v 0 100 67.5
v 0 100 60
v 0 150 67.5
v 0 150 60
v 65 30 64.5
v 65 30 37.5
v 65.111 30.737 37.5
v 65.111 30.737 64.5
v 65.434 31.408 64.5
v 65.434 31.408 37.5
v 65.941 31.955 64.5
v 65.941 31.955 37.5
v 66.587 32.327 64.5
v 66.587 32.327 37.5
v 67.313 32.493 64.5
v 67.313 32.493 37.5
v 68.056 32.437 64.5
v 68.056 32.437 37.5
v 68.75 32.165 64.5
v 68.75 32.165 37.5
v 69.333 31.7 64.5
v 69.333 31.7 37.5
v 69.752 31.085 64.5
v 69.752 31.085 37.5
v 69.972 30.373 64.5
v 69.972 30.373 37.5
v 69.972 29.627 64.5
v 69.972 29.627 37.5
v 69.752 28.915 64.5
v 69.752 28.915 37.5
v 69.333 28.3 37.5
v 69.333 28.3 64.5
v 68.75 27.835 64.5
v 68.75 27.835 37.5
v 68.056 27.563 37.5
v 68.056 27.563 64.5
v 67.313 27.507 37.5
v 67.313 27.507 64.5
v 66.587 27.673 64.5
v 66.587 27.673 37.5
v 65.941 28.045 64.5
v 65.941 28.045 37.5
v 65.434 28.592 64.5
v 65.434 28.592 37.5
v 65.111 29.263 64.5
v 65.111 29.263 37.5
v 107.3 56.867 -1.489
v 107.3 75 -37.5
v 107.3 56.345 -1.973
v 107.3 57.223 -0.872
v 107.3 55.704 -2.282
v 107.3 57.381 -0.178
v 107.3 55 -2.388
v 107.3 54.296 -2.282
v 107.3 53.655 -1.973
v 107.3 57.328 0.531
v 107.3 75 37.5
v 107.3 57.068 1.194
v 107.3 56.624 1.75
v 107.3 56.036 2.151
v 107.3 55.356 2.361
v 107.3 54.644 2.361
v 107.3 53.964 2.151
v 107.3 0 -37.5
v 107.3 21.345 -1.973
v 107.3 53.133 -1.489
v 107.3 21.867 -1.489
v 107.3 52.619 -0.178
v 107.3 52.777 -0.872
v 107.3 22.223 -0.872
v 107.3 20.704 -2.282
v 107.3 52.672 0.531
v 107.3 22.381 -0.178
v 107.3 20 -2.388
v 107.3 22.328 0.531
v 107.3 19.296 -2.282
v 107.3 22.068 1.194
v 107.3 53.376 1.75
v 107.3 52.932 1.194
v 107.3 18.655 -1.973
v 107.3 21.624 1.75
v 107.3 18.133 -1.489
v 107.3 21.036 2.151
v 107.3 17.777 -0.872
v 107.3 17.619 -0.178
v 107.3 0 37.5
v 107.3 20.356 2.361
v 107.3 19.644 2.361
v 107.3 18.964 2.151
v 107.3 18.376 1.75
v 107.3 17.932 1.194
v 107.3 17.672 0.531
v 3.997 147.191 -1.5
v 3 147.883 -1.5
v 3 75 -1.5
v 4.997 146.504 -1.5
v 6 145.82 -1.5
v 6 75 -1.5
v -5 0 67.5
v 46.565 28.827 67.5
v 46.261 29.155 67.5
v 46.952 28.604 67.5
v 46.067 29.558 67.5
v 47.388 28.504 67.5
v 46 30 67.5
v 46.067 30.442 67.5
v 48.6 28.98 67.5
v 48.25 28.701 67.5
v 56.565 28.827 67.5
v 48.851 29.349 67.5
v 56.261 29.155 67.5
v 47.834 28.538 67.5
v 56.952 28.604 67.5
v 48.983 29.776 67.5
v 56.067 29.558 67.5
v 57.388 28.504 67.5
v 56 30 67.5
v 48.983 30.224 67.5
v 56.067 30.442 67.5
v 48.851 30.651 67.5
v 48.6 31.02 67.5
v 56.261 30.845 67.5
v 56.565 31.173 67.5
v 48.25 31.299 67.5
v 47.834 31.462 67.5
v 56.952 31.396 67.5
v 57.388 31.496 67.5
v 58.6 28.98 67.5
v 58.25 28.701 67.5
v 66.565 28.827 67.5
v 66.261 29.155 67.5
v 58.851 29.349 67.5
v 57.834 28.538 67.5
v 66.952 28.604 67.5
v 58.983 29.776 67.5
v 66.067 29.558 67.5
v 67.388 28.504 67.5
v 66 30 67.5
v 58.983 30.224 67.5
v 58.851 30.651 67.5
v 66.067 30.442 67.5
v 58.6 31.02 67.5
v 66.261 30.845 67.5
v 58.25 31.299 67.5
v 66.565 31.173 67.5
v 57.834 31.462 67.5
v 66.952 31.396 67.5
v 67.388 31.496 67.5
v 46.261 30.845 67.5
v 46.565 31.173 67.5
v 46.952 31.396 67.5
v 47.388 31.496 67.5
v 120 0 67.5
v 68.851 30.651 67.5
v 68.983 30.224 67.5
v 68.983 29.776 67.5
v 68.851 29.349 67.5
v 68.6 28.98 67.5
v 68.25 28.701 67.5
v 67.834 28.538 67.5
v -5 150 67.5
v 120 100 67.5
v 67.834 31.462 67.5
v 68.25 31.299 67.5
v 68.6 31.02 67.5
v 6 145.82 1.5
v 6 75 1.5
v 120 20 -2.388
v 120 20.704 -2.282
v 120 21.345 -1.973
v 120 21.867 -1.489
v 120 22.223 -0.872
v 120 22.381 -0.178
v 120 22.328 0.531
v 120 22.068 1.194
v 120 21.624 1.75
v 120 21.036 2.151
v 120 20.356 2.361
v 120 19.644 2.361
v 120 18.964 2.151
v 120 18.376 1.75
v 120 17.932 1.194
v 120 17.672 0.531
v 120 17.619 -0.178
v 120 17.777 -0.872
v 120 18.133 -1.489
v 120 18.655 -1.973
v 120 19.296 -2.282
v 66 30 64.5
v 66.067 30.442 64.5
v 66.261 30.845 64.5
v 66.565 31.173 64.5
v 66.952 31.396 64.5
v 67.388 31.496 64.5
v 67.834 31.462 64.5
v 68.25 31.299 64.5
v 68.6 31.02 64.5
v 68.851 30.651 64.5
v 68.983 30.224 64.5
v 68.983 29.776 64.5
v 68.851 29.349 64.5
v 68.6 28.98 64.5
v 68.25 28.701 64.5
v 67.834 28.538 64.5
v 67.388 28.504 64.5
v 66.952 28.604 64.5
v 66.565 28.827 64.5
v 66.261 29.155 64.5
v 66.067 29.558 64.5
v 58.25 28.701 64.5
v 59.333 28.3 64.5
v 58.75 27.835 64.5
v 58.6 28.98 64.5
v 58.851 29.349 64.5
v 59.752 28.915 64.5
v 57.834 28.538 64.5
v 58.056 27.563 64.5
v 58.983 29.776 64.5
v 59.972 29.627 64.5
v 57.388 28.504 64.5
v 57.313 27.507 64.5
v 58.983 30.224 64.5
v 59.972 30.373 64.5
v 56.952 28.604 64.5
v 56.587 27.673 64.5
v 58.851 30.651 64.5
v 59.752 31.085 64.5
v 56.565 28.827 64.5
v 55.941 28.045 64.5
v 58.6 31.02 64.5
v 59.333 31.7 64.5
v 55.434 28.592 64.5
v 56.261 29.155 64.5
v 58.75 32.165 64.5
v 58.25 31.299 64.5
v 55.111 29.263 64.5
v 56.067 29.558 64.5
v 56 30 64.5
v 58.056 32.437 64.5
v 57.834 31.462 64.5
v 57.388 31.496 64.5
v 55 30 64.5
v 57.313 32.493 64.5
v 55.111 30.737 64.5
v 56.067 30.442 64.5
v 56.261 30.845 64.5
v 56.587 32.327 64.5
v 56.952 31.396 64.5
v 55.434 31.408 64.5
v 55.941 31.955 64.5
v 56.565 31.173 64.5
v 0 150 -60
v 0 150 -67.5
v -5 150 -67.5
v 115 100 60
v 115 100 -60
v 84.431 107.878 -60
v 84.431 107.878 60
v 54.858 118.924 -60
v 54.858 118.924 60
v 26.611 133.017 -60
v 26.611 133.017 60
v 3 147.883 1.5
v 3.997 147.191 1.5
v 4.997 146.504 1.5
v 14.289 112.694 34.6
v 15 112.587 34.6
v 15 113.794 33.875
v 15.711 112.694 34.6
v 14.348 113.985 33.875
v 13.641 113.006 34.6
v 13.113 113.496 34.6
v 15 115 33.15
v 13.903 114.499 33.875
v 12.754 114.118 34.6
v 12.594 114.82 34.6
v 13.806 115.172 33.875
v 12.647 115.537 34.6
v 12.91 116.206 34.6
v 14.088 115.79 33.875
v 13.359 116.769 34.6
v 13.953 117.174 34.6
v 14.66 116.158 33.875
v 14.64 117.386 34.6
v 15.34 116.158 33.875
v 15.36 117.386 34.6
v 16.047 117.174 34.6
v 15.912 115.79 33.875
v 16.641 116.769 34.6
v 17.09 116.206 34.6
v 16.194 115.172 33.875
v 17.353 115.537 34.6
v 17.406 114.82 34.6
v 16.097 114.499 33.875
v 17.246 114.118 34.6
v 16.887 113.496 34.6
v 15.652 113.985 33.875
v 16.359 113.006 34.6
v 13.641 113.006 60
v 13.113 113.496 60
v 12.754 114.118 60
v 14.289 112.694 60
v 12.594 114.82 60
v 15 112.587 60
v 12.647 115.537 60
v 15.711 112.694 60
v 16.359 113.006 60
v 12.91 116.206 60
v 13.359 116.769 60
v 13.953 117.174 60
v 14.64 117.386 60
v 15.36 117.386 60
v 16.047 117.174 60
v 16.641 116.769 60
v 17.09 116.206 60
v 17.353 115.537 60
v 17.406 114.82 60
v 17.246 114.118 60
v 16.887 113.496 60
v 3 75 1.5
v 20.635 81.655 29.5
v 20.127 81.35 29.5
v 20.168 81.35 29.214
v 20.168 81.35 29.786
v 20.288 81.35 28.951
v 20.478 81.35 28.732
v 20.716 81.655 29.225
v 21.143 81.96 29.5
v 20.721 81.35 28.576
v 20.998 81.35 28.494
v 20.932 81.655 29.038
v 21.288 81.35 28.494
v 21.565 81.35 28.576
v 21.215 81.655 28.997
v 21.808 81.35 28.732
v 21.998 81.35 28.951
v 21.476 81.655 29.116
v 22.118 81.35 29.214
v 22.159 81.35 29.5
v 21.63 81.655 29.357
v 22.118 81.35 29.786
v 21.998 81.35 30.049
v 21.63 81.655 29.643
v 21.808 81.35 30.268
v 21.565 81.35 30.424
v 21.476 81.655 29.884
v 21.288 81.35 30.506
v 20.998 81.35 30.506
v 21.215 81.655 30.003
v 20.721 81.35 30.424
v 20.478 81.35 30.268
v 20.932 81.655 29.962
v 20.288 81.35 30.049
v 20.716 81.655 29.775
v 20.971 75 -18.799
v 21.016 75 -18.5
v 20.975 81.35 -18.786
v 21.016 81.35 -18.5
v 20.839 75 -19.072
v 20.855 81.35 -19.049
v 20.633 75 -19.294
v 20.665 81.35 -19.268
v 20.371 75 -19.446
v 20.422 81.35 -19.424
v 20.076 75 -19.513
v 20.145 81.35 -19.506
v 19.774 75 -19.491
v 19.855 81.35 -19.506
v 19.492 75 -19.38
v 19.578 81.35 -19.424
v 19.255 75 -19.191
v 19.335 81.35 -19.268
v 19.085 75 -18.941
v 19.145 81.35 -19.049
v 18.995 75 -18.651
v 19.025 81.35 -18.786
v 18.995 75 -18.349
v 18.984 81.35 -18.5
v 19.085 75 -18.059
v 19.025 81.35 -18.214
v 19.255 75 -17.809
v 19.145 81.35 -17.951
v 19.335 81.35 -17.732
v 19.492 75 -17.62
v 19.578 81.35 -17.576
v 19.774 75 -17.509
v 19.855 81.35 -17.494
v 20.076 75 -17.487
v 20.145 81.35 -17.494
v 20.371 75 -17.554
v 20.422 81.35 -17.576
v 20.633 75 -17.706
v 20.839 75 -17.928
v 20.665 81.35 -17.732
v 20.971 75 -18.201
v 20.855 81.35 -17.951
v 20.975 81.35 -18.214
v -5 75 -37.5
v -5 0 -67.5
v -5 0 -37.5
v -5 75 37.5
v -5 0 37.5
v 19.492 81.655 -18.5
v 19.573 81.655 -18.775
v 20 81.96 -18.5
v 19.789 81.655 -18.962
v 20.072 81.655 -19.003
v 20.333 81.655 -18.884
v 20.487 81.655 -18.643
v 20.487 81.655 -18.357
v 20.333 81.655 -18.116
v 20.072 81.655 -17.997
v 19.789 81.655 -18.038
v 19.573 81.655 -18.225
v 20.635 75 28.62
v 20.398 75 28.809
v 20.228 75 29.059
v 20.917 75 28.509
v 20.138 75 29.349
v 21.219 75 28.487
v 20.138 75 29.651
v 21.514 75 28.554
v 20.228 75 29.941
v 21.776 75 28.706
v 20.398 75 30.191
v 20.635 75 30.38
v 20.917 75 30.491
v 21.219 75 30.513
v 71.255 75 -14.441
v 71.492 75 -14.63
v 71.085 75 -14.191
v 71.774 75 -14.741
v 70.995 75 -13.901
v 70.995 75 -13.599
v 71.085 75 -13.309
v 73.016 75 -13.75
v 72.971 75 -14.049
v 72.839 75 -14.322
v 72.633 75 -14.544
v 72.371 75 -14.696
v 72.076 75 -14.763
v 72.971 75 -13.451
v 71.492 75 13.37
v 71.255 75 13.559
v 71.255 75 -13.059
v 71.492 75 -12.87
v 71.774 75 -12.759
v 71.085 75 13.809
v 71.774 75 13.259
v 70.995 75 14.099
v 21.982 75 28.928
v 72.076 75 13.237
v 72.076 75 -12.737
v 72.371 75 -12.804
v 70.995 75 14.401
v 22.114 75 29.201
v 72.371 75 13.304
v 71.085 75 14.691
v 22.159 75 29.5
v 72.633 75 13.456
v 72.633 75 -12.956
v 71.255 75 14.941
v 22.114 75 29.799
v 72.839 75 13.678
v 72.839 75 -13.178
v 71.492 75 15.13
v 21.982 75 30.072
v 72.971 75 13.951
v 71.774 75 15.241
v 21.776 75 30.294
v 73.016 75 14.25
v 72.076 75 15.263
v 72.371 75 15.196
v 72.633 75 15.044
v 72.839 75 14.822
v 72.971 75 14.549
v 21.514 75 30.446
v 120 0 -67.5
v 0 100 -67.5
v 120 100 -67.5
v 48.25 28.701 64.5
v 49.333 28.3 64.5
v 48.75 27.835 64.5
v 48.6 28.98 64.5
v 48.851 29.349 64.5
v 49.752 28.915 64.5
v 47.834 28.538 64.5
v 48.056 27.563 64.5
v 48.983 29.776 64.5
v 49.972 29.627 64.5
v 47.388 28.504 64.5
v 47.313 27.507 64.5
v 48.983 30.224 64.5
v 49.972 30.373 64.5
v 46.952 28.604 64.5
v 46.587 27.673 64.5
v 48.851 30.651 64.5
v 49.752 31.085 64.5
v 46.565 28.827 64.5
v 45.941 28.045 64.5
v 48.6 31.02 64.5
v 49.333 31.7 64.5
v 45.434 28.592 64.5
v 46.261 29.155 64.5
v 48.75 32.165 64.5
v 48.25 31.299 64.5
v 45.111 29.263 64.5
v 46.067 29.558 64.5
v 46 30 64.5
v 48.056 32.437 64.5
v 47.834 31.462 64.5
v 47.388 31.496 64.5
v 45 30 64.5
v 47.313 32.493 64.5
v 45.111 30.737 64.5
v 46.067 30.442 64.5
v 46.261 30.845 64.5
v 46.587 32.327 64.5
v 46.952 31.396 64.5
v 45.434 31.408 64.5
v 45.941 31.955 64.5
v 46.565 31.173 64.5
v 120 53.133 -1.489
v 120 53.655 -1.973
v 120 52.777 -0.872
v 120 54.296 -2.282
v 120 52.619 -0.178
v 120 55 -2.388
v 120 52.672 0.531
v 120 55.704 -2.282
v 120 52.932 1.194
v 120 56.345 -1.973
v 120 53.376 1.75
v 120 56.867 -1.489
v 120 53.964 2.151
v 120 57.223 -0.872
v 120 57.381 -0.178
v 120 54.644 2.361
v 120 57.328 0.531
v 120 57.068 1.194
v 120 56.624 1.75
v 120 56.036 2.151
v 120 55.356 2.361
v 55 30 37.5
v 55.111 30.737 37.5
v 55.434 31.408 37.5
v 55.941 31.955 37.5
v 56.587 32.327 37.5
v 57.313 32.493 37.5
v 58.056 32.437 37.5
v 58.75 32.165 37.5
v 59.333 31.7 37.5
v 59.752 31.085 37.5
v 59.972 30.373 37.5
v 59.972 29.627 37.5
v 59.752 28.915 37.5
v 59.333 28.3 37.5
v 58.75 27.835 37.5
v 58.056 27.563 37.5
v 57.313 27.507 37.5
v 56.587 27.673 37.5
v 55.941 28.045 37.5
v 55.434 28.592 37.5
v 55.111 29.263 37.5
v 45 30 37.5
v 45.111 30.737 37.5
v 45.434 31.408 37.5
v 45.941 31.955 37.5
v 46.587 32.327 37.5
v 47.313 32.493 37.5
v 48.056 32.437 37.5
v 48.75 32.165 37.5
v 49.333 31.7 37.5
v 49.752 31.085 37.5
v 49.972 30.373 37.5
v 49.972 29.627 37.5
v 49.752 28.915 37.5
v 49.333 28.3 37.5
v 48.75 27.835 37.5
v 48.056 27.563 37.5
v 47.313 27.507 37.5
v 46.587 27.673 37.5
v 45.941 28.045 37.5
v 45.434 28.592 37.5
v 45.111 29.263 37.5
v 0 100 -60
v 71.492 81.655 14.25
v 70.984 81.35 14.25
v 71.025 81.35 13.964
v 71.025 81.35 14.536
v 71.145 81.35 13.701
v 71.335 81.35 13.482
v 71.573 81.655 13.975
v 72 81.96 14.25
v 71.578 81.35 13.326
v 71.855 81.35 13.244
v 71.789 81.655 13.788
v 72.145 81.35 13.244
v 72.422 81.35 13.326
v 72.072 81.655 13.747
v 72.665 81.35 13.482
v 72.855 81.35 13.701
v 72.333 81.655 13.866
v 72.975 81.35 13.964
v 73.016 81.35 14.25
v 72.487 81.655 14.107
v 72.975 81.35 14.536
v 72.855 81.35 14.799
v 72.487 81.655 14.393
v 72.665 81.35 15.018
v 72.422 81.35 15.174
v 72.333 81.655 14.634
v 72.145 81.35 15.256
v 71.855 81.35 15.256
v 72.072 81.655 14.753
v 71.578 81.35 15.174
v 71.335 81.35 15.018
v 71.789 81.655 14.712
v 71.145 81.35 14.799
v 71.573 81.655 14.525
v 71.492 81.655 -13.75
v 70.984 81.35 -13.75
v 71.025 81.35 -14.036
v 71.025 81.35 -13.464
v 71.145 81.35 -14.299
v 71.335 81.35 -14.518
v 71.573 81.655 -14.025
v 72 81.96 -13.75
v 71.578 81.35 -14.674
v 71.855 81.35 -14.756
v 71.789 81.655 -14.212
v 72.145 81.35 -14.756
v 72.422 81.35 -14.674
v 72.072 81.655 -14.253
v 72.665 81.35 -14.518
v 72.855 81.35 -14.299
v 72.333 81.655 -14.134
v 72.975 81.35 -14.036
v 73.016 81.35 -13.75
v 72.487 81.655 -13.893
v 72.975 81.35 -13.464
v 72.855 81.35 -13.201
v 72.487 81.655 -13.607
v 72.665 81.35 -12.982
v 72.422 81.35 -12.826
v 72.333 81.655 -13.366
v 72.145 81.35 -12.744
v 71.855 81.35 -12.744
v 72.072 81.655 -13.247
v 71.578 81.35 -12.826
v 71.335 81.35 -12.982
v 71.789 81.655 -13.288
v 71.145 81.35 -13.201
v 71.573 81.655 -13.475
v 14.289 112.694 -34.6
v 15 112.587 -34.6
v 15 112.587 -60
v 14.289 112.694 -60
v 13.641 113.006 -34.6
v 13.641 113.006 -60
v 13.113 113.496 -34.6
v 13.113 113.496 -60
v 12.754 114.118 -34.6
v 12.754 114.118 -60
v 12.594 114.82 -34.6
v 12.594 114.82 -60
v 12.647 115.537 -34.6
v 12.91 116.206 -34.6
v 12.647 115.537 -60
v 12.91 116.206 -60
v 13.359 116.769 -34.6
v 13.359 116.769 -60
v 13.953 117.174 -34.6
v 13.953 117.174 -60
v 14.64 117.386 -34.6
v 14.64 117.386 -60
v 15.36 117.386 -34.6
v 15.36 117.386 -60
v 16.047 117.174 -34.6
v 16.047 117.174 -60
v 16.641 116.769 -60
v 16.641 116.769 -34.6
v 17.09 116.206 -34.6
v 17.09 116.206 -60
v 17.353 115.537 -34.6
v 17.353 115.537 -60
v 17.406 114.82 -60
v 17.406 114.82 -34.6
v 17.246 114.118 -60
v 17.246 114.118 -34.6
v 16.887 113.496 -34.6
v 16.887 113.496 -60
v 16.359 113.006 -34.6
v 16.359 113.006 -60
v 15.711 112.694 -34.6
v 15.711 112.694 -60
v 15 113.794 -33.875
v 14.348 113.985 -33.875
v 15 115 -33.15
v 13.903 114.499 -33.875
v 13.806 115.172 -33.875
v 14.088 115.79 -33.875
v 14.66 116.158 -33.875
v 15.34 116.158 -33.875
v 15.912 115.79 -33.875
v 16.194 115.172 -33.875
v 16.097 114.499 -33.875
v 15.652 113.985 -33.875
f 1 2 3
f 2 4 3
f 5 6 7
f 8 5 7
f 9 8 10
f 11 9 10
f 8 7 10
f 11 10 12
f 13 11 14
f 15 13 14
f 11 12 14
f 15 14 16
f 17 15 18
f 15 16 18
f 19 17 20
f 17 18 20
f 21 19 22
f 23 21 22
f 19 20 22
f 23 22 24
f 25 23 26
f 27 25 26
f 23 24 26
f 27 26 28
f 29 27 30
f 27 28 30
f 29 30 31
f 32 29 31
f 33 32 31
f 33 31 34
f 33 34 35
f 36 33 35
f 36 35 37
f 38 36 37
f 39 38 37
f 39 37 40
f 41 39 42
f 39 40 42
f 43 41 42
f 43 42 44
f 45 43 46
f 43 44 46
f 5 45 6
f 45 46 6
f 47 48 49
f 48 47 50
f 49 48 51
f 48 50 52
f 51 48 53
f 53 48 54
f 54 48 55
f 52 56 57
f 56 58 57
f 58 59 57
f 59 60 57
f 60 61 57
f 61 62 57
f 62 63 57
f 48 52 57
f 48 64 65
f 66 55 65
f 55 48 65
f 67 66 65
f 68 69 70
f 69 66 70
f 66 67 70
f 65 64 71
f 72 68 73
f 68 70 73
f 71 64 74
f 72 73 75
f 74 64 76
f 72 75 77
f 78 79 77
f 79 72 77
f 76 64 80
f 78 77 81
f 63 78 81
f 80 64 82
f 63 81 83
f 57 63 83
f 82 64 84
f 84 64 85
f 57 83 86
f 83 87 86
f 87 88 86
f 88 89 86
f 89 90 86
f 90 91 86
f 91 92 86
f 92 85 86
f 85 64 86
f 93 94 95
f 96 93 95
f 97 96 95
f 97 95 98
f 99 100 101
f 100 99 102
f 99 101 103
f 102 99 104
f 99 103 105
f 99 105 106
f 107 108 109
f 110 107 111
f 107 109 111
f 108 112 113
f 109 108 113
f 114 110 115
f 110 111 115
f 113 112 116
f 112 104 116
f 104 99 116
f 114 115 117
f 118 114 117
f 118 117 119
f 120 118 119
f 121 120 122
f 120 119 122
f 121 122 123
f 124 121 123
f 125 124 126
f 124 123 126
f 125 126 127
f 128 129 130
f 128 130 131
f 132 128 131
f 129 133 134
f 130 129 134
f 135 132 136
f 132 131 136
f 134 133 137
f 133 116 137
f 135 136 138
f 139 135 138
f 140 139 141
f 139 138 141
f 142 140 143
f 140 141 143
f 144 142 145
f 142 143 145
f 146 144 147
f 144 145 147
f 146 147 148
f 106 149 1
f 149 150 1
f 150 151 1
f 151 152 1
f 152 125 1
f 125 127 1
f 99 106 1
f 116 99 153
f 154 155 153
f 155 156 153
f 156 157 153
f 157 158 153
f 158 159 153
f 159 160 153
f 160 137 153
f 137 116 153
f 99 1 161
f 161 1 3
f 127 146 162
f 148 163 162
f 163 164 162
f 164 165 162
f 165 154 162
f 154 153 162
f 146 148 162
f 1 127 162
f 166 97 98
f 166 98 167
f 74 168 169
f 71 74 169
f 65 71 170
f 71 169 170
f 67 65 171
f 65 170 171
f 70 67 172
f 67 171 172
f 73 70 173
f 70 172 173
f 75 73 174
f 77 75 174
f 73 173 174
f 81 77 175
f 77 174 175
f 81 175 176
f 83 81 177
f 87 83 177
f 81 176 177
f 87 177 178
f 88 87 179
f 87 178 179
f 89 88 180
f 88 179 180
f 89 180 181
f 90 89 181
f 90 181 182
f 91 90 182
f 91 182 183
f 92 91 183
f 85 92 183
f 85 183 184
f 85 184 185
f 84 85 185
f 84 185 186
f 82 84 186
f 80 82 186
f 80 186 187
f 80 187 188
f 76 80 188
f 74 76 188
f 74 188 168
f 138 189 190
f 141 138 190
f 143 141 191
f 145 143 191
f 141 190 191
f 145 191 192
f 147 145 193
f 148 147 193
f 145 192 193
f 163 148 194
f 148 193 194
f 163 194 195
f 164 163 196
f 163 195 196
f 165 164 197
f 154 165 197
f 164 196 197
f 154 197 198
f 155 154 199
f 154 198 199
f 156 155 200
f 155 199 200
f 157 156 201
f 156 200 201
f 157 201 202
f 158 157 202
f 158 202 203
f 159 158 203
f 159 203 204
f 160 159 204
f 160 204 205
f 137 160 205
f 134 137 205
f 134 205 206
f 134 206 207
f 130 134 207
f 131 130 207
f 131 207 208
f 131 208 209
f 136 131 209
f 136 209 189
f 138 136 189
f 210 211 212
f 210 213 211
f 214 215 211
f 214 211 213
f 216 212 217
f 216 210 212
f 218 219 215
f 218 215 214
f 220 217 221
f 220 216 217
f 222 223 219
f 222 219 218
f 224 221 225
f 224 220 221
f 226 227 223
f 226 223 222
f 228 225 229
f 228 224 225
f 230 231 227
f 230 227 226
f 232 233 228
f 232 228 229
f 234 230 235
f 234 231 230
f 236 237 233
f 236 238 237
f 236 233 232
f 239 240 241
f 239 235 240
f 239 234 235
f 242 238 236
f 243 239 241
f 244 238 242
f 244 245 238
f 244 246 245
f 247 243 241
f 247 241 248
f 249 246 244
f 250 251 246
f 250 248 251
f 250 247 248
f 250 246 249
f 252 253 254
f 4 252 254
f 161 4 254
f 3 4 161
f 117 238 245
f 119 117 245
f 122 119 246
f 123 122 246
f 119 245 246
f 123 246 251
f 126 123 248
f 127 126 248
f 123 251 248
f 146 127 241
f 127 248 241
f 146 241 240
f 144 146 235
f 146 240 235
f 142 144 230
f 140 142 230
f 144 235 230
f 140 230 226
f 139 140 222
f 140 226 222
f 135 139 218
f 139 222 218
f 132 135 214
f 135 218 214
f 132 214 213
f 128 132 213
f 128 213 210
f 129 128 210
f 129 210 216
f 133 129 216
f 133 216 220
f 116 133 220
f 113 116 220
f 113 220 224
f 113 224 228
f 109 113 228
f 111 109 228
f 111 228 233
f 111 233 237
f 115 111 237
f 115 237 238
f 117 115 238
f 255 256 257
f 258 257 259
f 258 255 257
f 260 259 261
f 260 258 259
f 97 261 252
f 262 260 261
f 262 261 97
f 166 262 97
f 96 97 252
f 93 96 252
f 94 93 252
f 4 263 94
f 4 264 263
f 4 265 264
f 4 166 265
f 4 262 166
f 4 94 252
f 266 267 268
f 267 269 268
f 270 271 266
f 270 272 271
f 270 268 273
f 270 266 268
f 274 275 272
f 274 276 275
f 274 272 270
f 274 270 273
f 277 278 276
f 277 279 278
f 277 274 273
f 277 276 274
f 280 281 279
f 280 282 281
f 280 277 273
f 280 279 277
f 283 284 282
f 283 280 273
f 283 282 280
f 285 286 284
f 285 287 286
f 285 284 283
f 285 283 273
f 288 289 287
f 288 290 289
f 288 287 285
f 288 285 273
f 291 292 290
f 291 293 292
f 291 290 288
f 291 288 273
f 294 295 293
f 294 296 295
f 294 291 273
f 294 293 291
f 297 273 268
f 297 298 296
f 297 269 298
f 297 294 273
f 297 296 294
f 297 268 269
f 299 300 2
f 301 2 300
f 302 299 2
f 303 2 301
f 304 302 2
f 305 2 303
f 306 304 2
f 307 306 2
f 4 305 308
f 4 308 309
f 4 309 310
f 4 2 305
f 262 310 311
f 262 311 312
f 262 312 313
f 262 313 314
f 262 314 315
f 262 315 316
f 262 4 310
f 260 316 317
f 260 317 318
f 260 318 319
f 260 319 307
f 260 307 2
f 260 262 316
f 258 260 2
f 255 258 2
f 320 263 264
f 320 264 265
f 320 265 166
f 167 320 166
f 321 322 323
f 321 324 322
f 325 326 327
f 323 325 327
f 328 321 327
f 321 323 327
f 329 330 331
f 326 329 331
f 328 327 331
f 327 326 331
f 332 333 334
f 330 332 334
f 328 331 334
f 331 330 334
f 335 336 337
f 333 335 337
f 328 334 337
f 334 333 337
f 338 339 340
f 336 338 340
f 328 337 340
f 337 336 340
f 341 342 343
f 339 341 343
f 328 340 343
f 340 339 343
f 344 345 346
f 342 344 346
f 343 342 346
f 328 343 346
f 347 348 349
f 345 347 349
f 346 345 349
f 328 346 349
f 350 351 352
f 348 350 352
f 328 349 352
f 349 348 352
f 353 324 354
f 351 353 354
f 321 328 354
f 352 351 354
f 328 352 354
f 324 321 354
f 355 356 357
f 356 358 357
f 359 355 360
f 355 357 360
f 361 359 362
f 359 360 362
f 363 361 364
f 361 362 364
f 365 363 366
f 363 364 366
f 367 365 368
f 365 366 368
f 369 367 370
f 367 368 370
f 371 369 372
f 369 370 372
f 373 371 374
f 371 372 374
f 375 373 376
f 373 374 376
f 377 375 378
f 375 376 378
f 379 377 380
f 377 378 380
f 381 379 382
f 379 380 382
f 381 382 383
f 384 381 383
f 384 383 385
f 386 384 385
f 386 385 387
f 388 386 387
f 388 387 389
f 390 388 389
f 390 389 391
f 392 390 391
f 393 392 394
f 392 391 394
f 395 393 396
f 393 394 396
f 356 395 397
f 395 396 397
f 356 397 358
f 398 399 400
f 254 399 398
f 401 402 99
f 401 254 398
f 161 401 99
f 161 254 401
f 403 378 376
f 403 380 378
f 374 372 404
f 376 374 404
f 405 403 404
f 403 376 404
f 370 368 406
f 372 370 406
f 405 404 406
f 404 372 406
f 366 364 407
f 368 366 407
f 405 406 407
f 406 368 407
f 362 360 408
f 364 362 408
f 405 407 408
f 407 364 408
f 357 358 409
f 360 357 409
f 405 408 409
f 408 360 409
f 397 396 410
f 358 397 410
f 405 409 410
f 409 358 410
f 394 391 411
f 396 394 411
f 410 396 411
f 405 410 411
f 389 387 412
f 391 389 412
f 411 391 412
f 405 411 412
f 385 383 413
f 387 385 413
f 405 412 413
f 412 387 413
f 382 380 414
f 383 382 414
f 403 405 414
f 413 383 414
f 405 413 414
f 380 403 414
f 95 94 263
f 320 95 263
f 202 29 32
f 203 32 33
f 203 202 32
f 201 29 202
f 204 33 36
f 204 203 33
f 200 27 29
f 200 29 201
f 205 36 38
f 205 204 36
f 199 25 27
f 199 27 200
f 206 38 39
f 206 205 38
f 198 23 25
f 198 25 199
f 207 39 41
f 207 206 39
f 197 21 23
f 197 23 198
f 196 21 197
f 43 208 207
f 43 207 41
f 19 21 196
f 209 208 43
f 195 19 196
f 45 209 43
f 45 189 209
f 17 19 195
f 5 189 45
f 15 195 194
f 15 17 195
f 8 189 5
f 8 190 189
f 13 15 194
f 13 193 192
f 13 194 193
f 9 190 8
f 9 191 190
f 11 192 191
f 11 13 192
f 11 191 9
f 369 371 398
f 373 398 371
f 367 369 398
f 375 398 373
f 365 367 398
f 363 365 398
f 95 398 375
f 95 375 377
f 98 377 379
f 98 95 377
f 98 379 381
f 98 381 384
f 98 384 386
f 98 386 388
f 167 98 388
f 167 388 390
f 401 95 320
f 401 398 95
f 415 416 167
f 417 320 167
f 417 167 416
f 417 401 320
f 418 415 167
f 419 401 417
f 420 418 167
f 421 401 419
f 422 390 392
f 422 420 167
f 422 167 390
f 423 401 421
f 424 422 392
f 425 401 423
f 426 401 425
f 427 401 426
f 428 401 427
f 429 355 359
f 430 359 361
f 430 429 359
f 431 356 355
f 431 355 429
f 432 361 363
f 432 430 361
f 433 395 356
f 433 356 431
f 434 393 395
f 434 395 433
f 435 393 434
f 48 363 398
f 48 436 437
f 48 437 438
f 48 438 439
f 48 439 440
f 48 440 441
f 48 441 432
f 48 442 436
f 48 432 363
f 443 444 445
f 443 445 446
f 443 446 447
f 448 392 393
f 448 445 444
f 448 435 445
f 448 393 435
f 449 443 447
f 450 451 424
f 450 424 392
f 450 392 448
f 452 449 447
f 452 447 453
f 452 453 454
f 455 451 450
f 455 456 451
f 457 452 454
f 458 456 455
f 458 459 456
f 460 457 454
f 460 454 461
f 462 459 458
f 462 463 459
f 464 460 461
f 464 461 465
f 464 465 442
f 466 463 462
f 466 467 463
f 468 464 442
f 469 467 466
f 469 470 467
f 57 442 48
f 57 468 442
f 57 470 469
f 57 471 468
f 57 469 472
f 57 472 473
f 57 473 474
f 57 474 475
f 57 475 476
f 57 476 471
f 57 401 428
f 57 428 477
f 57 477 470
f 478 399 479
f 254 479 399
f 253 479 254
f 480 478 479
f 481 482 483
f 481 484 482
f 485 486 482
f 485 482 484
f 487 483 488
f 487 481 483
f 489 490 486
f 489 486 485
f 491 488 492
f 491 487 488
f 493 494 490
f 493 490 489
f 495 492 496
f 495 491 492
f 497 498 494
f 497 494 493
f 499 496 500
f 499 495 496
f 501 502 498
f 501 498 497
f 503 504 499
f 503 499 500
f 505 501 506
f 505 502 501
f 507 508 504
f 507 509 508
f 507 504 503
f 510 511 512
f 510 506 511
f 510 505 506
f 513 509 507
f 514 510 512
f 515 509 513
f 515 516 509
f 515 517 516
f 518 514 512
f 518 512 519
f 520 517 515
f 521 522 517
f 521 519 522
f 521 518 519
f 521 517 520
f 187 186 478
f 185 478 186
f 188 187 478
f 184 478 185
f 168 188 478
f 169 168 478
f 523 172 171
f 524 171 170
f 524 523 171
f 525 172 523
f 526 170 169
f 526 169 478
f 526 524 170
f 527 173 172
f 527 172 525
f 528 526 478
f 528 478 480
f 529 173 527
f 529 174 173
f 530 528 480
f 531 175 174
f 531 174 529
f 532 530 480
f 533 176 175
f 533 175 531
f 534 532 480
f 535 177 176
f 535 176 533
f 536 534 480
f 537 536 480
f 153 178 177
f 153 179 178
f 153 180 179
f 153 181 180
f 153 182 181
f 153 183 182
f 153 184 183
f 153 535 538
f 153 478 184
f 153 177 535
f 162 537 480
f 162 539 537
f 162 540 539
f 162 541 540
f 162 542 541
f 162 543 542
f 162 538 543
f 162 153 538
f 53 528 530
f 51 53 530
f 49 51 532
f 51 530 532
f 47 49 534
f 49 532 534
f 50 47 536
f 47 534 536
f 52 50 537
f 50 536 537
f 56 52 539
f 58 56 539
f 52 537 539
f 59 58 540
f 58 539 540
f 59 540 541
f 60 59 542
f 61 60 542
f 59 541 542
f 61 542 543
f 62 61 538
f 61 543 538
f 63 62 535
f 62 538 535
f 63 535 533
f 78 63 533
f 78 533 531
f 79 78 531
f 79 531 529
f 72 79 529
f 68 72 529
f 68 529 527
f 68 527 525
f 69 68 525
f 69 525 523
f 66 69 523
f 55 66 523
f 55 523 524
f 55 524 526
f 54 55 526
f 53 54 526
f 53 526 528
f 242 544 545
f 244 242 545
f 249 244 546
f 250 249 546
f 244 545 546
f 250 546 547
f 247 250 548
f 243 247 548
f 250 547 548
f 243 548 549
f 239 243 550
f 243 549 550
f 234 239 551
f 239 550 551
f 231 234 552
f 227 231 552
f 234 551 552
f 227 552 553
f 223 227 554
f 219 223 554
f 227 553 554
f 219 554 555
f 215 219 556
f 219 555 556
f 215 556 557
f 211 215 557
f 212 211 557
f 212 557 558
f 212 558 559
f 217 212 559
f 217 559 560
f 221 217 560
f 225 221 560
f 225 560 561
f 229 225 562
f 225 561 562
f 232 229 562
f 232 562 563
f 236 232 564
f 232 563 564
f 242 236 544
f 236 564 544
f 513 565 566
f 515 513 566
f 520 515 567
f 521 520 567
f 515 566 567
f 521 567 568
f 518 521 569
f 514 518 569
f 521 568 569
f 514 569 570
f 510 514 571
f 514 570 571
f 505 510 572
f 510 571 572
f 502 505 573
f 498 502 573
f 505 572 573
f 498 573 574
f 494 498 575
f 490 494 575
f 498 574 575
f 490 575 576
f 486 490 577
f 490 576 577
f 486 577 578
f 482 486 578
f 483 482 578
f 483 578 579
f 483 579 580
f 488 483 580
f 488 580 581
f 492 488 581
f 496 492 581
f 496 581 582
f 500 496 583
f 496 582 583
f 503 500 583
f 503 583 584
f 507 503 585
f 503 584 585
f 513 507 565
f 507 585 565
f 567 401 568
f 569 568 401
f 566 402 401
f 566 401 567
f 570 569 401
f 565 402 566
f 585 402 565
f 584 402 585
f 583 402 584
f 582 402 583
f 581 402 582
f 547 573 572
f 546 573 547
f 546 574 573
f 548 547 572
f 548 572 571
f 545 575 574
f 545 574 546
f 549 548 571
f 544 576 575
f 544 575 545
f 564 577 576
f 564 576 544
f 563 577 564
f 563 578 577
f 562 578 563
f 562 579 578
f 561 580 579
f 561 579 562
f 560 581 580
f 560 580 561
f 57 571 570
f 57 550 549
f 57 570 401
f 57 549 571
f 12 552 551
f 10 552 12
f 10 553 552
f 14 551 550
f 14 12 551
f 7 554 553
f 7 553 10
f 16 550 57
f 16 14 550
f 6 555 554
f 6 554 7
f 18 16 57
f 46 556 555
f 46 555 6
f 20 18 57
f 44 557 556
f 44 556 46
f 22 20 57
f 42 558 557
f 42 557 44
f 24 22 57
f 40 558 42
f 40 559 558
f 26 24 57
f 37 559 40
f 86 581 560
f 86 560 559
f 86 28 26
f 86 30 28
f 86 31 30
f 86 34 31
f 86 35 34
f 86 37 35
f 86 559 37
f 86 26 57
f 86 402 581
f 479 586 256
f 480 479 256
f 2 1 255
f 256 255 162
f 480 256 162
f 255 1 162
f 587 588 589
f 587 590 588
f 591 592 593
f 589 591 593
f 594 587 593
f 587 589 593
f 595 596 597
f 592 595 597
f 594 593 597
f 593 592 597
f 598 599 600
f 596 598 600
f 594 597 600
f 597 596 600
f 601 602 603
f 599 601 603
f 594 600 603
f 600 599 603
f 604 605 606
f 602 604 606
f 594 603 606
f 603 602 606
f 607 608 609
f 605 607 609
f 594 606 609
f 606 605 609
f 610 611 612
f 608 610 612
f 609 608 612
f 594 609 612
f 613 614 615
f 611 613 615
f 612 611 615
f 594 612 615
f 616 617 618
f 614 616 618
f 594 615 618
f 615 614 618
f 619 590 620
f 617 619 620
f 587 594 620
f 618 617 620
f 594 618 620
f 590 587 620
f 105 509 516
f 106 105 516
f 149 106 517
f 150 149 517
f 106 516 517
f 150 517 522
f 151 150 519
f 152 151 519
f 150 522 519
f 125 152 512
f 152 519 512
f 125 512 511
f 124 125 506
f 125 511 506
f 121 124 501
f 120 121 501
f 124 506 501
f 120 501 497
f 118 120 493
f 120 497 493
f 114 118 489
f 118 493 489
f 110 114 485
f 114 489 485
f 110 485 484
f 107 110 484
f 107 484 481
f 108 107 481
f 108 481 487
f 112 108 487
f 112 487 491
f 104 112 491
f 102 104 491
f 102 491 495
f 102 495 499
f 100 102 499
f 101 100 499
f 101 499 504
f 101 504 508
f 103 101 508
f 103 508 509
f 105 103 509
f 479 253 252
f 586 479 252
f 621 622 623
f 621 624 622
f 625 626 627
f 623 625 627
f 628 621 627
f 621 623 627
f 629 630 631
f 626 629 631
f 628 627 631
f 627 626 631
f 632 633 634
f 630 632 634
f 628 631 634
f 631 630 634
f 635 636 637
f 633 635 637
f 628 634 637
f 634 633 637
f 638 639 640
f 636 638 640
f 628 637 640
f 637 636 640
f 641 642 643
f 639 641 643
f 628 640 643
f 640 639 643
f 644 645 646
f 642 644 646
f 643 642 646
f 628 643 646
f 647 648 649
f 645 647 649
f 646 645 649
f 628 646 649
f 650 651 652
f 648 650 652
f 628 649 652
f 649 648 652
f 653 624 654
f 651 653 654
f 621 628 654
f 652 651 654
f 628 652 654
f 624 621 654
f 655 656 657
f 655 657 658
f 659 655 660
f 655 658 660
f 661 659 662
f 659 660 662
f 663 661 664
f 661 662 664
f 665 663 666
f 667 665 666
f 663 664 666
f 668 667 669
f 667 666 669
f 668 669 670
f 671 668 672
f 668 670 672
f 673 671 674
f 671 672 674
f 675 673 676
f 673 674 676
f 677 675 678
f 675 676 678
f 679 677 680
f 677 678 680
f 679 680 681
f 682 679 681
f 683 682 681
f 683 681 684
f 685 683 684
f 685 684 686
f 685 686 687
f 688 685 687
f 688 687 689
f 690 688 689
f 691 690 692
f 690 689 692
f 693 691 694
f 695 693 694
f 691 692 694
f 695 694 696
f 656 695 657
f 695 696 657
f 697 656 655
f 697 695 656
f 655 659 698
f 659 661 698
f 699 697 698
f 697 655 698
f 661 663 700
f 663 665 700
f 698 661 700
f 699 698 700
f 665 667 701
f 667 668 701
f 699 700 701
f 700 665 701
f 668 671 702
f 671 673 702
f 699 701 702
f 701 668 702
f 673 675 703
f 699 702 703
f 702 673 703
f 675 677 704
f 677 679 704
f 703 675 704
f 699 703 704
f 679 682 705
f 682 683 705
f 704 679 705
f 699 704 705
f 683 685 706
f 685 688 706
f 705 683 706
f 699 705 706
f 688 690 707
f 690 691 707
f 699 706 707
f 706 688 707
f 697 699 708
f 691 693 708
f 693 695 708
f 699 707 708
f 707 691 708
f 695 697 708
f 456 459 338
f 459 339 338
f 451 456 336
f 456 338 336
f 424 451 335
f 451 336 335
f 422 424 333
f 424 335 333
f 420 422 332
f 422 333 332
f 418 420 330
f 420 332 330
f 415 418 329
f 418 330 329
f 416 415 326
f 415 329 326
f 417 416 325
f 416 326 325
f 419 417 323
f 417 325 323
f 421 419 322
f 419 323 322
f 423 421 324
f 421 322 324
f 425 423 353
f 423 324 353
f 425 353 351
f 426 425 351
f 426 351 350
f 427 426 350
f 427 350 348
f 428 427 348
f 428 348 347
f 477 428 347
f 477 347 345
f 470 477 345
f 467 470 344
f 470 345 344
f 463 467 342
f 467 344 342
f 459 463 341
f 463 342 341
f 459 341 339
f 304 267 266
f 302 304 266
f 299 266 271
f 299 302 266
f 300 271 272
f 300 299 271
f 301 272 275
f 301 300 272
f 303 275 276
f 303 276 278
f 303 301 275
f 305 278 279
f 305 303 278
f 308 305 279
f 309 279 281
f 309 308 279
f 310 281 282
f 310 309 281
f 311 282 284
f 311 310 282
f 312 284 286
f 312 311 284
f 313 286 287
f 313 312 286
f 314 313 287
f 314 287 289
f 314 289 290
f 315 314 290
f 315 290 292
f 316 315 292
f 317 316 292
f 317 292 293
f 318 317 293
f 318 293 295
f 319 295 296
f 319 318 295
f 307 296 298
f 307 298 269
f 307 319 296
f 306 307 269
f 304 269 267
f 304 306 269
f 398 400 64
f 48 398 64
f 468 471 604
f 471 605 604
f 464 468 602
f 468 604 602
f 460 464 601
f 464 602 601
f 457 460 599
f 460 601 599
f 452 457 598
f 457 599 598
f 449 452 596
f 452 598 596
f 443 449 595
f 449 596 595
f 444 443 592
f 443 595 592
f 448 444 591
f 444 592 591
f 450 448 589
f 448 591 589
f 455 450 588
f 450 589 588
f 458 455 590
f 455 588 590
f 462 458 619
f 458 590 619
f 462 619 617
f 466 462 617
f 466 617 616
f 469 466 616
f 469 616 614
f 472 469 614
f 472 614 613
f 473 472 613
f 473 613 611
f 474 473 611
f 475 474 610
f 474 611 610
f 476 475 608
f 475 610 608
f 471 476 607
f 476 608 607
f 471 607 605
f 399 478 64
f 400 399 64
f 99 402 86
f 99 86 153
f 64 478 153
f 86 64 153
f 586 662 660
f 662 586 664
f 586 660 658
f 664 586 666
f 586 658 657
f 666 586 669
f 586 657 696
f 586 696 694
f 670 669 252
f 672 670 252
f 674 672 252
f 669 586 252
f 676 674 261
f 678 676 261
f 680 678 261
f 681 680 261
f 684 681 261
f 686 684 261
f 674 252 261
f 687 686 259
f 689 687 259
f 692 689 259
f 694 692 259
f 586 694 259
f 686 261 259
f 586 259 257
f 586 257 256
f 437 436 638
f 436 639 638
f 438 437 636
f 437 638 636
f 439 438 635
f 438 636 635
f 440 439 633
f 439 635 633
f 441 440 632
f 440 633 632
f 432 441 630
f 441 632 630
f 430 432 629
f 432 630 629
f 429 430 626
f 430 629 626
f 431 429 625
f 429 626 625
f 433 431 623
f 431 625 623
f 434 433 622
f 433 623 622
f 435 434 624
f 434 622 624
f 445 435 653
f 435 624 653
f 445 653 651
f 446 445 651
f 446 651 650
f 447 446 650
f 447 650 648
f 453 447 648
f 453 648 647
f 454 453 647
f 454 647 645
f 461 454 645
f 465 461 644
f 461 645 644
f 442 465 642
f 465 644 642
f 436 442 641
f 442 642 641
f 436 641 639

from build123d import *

# Parameters (mm, degrees)
BOSS_EXTRUDE2_DEPTH       = 60
SKETCH4_W                 = 120
SKETCH4_H                 = 100
BOSS_EXTRUDE3_DEPTH       = 7.5
SKETCH5_W                 = 135
SKETCH5_H                 = 150
BOSS_EXTRUDE4_DEPTH       = 5
SKETCH6_W                 = 112.3
SKETCH6_H                 = 75
CUT_EXTRUDE2_DEPTH        = 75
F_10_CLEARANCE_HOLE1_D    = 4.7752
F_2_CLEARANCE_HOLE1_D     = 2.032
F_2_CLEARANCE_HOLE1_DEPTH = 6.35
F_2_CLEARANCE_HOLE1_TIP   = 0.610474389
SKETCH17_W                = 3
SKETCH17_H                = 3
CUT_EXTRUDE4_DEPTH        = 76
SKETCH18_R                = 2.5
CUT_EXTRUDE5_DEPTH        = 27
SKETCH19_R                = 1.5
CUT_EXTRUDE6_DEPTH        = 4


with BuildPart() as part:
    # Sketch3 → Boss-Extrude2 (new body, symmetric)
    with BuildSketch(Plane.XY):
        with BuildLine():
            Line((0, 0), (120, 0))
            Line((120, 0), (120, 100))
            Line((120, 100), (115, 100))
            ThreePointArc((115, 100), (54.85834395, 118.924191085), (0, 150))
            Line((0, 150), (0, 0))
        make_face()
    extrude(amount=BOSS_EXTRUDE2_DEPTH, both=True)

    # Sketch4 → Boss-Extrude3 (add)
    with BuildSketch(Plane.XY.offset(60)):
        with Locations((60, 50)):
            Rectangle(SKETCH4_W, SKETCH4_H)
    boss_extrude3 = extrude(amount=BOSS_EXTRUDE3_DEPTH)

    # Mirror1: Boss-Extrude3 across plane
    add(boss_extrude3.mirror(Plane.XY))

    # Sketch5 → Boss-Extrude4 (add)
    with BuildSketch(Plane.ZY):
        with Locations((0, 75)):
            Rectangle(SKETCH5_W, SKETCH5_H)
    extrude(amount=BOSS_EXTRUDE4_DEPTH)

    # Sketch6 → Cut-Extrude2 (cut)
    with BuildSketch(Plane.XZ):
        with Locations((51.15, 0)):
            Rectangle(SKETCH6_W, SKETCH6_H)
    extrude(amount=-CUT_EXTRUDE2_DEPTH, mode=Mode.SUBTRACT)

    # #10 Clearance Hole1 (through all)
    with Locations(Plane.ZY.offset(-107.3)):
        with Locations((0, 55), (0, 20)):
            Hole(F_10_CLEARANCE_HOLE1_D / 2)

    # #2 Clearance Hole1
    with Locations(Plane(origin=(0, 75, 0), x_dir=(-1, 0, 0), z_dir=(0, -1, 0))):
        with Locations((-20, 18.5), (-72, -14.25), (-72, 13.75), (-21.143, -29.5)):
            Hole(F_2_CLEARANCE_HOLE1_D / 2, depth=F_2_CLEARANCE_HOLE1_DEPTH)
            with Locations((0, 0, -(F_2_CLEARANCE_HOLE1_DEPTH + F_2_CLEARANCE_HOLE1_TIP / 2))):  # 118° drill point
                Cone(0, F_2_CLEARANCE_HOLE1_D / 2, F_2_CLEARANCE_HOLE1_TIP, mode=Mode.SUBTRACT)

    # Sketch15 → #10 Clearance Hole2 (revolve, cut)
    with BuildSketch(Plane(origin=(15, 115, 60), x_dir=(0, -1, 0), z_dir=(1, 0, 0))):
        Polygon((0, 0), (0, 26.849876674), (2.413, 25.4), (2.413, 0), align=None)
    f_10_clearance_hole2 = revolve(axis=Axis((15, 115, 66.35), (0, 0, -1)), mode=Mode.SUBTRACT)

    # Mirror2: #10 Clearance Hole2 across plane
    add(f_10_clearance_hole2.mirror(Plane.XY), mode=Mode.SUBTRACT)

    # Sketch17 → Cut-Extrude4 (cut, through all)
    with BuildSketch(Plane.XZ.offset(-75)):
        with Locations((4.5, 0)):
            Rectangle(SKETCH17_W, SKETCH17_H)
    extrude(amount=-CUT_EXTRUDE4_DEPTH, mode=Mode.SUBTRACT)

    # Sketch18 → Cut-Extrude5 (cut)
    with BuildSketch(Plane(origin=(0, 0, 37.5), x_dir=(-1, 0, 0), z_dir=(0, 0, -1))):
        with Locations((-67.5, 30)):
            Circle(SKETCH18_R)
        with Locations((-57.5, 30)):
            Circle(SKETCH18_R)
        with Locations((-47.5, 30)):
            Circle(SKETCH18_R)
    extrude(amount=-CUT_EXTRUDE5_DEPTH, mode=Mode.SUBTRACT)

    # Sketch19 → Cut-Extrude6 (cut, through all)
    with BuildSketch(Plane(origin=(0, 0, 64.5), x_dir=(-1, 0, 0), z_dir=(0, 0, -1))):
        with Locations((-67.5, 30)):
            Circle(SKETCH19_R)
        with Locations((-57.5, 30)):
            Circle(SKETCH19_R)
        with Locations((-47.5, 30)):
            Circle(SKETCH19_R)
    extrude(amount=-CUT_EXTRUDE6_DEPTH, mode=Mode.SUBTRACT)


solid = part.part
